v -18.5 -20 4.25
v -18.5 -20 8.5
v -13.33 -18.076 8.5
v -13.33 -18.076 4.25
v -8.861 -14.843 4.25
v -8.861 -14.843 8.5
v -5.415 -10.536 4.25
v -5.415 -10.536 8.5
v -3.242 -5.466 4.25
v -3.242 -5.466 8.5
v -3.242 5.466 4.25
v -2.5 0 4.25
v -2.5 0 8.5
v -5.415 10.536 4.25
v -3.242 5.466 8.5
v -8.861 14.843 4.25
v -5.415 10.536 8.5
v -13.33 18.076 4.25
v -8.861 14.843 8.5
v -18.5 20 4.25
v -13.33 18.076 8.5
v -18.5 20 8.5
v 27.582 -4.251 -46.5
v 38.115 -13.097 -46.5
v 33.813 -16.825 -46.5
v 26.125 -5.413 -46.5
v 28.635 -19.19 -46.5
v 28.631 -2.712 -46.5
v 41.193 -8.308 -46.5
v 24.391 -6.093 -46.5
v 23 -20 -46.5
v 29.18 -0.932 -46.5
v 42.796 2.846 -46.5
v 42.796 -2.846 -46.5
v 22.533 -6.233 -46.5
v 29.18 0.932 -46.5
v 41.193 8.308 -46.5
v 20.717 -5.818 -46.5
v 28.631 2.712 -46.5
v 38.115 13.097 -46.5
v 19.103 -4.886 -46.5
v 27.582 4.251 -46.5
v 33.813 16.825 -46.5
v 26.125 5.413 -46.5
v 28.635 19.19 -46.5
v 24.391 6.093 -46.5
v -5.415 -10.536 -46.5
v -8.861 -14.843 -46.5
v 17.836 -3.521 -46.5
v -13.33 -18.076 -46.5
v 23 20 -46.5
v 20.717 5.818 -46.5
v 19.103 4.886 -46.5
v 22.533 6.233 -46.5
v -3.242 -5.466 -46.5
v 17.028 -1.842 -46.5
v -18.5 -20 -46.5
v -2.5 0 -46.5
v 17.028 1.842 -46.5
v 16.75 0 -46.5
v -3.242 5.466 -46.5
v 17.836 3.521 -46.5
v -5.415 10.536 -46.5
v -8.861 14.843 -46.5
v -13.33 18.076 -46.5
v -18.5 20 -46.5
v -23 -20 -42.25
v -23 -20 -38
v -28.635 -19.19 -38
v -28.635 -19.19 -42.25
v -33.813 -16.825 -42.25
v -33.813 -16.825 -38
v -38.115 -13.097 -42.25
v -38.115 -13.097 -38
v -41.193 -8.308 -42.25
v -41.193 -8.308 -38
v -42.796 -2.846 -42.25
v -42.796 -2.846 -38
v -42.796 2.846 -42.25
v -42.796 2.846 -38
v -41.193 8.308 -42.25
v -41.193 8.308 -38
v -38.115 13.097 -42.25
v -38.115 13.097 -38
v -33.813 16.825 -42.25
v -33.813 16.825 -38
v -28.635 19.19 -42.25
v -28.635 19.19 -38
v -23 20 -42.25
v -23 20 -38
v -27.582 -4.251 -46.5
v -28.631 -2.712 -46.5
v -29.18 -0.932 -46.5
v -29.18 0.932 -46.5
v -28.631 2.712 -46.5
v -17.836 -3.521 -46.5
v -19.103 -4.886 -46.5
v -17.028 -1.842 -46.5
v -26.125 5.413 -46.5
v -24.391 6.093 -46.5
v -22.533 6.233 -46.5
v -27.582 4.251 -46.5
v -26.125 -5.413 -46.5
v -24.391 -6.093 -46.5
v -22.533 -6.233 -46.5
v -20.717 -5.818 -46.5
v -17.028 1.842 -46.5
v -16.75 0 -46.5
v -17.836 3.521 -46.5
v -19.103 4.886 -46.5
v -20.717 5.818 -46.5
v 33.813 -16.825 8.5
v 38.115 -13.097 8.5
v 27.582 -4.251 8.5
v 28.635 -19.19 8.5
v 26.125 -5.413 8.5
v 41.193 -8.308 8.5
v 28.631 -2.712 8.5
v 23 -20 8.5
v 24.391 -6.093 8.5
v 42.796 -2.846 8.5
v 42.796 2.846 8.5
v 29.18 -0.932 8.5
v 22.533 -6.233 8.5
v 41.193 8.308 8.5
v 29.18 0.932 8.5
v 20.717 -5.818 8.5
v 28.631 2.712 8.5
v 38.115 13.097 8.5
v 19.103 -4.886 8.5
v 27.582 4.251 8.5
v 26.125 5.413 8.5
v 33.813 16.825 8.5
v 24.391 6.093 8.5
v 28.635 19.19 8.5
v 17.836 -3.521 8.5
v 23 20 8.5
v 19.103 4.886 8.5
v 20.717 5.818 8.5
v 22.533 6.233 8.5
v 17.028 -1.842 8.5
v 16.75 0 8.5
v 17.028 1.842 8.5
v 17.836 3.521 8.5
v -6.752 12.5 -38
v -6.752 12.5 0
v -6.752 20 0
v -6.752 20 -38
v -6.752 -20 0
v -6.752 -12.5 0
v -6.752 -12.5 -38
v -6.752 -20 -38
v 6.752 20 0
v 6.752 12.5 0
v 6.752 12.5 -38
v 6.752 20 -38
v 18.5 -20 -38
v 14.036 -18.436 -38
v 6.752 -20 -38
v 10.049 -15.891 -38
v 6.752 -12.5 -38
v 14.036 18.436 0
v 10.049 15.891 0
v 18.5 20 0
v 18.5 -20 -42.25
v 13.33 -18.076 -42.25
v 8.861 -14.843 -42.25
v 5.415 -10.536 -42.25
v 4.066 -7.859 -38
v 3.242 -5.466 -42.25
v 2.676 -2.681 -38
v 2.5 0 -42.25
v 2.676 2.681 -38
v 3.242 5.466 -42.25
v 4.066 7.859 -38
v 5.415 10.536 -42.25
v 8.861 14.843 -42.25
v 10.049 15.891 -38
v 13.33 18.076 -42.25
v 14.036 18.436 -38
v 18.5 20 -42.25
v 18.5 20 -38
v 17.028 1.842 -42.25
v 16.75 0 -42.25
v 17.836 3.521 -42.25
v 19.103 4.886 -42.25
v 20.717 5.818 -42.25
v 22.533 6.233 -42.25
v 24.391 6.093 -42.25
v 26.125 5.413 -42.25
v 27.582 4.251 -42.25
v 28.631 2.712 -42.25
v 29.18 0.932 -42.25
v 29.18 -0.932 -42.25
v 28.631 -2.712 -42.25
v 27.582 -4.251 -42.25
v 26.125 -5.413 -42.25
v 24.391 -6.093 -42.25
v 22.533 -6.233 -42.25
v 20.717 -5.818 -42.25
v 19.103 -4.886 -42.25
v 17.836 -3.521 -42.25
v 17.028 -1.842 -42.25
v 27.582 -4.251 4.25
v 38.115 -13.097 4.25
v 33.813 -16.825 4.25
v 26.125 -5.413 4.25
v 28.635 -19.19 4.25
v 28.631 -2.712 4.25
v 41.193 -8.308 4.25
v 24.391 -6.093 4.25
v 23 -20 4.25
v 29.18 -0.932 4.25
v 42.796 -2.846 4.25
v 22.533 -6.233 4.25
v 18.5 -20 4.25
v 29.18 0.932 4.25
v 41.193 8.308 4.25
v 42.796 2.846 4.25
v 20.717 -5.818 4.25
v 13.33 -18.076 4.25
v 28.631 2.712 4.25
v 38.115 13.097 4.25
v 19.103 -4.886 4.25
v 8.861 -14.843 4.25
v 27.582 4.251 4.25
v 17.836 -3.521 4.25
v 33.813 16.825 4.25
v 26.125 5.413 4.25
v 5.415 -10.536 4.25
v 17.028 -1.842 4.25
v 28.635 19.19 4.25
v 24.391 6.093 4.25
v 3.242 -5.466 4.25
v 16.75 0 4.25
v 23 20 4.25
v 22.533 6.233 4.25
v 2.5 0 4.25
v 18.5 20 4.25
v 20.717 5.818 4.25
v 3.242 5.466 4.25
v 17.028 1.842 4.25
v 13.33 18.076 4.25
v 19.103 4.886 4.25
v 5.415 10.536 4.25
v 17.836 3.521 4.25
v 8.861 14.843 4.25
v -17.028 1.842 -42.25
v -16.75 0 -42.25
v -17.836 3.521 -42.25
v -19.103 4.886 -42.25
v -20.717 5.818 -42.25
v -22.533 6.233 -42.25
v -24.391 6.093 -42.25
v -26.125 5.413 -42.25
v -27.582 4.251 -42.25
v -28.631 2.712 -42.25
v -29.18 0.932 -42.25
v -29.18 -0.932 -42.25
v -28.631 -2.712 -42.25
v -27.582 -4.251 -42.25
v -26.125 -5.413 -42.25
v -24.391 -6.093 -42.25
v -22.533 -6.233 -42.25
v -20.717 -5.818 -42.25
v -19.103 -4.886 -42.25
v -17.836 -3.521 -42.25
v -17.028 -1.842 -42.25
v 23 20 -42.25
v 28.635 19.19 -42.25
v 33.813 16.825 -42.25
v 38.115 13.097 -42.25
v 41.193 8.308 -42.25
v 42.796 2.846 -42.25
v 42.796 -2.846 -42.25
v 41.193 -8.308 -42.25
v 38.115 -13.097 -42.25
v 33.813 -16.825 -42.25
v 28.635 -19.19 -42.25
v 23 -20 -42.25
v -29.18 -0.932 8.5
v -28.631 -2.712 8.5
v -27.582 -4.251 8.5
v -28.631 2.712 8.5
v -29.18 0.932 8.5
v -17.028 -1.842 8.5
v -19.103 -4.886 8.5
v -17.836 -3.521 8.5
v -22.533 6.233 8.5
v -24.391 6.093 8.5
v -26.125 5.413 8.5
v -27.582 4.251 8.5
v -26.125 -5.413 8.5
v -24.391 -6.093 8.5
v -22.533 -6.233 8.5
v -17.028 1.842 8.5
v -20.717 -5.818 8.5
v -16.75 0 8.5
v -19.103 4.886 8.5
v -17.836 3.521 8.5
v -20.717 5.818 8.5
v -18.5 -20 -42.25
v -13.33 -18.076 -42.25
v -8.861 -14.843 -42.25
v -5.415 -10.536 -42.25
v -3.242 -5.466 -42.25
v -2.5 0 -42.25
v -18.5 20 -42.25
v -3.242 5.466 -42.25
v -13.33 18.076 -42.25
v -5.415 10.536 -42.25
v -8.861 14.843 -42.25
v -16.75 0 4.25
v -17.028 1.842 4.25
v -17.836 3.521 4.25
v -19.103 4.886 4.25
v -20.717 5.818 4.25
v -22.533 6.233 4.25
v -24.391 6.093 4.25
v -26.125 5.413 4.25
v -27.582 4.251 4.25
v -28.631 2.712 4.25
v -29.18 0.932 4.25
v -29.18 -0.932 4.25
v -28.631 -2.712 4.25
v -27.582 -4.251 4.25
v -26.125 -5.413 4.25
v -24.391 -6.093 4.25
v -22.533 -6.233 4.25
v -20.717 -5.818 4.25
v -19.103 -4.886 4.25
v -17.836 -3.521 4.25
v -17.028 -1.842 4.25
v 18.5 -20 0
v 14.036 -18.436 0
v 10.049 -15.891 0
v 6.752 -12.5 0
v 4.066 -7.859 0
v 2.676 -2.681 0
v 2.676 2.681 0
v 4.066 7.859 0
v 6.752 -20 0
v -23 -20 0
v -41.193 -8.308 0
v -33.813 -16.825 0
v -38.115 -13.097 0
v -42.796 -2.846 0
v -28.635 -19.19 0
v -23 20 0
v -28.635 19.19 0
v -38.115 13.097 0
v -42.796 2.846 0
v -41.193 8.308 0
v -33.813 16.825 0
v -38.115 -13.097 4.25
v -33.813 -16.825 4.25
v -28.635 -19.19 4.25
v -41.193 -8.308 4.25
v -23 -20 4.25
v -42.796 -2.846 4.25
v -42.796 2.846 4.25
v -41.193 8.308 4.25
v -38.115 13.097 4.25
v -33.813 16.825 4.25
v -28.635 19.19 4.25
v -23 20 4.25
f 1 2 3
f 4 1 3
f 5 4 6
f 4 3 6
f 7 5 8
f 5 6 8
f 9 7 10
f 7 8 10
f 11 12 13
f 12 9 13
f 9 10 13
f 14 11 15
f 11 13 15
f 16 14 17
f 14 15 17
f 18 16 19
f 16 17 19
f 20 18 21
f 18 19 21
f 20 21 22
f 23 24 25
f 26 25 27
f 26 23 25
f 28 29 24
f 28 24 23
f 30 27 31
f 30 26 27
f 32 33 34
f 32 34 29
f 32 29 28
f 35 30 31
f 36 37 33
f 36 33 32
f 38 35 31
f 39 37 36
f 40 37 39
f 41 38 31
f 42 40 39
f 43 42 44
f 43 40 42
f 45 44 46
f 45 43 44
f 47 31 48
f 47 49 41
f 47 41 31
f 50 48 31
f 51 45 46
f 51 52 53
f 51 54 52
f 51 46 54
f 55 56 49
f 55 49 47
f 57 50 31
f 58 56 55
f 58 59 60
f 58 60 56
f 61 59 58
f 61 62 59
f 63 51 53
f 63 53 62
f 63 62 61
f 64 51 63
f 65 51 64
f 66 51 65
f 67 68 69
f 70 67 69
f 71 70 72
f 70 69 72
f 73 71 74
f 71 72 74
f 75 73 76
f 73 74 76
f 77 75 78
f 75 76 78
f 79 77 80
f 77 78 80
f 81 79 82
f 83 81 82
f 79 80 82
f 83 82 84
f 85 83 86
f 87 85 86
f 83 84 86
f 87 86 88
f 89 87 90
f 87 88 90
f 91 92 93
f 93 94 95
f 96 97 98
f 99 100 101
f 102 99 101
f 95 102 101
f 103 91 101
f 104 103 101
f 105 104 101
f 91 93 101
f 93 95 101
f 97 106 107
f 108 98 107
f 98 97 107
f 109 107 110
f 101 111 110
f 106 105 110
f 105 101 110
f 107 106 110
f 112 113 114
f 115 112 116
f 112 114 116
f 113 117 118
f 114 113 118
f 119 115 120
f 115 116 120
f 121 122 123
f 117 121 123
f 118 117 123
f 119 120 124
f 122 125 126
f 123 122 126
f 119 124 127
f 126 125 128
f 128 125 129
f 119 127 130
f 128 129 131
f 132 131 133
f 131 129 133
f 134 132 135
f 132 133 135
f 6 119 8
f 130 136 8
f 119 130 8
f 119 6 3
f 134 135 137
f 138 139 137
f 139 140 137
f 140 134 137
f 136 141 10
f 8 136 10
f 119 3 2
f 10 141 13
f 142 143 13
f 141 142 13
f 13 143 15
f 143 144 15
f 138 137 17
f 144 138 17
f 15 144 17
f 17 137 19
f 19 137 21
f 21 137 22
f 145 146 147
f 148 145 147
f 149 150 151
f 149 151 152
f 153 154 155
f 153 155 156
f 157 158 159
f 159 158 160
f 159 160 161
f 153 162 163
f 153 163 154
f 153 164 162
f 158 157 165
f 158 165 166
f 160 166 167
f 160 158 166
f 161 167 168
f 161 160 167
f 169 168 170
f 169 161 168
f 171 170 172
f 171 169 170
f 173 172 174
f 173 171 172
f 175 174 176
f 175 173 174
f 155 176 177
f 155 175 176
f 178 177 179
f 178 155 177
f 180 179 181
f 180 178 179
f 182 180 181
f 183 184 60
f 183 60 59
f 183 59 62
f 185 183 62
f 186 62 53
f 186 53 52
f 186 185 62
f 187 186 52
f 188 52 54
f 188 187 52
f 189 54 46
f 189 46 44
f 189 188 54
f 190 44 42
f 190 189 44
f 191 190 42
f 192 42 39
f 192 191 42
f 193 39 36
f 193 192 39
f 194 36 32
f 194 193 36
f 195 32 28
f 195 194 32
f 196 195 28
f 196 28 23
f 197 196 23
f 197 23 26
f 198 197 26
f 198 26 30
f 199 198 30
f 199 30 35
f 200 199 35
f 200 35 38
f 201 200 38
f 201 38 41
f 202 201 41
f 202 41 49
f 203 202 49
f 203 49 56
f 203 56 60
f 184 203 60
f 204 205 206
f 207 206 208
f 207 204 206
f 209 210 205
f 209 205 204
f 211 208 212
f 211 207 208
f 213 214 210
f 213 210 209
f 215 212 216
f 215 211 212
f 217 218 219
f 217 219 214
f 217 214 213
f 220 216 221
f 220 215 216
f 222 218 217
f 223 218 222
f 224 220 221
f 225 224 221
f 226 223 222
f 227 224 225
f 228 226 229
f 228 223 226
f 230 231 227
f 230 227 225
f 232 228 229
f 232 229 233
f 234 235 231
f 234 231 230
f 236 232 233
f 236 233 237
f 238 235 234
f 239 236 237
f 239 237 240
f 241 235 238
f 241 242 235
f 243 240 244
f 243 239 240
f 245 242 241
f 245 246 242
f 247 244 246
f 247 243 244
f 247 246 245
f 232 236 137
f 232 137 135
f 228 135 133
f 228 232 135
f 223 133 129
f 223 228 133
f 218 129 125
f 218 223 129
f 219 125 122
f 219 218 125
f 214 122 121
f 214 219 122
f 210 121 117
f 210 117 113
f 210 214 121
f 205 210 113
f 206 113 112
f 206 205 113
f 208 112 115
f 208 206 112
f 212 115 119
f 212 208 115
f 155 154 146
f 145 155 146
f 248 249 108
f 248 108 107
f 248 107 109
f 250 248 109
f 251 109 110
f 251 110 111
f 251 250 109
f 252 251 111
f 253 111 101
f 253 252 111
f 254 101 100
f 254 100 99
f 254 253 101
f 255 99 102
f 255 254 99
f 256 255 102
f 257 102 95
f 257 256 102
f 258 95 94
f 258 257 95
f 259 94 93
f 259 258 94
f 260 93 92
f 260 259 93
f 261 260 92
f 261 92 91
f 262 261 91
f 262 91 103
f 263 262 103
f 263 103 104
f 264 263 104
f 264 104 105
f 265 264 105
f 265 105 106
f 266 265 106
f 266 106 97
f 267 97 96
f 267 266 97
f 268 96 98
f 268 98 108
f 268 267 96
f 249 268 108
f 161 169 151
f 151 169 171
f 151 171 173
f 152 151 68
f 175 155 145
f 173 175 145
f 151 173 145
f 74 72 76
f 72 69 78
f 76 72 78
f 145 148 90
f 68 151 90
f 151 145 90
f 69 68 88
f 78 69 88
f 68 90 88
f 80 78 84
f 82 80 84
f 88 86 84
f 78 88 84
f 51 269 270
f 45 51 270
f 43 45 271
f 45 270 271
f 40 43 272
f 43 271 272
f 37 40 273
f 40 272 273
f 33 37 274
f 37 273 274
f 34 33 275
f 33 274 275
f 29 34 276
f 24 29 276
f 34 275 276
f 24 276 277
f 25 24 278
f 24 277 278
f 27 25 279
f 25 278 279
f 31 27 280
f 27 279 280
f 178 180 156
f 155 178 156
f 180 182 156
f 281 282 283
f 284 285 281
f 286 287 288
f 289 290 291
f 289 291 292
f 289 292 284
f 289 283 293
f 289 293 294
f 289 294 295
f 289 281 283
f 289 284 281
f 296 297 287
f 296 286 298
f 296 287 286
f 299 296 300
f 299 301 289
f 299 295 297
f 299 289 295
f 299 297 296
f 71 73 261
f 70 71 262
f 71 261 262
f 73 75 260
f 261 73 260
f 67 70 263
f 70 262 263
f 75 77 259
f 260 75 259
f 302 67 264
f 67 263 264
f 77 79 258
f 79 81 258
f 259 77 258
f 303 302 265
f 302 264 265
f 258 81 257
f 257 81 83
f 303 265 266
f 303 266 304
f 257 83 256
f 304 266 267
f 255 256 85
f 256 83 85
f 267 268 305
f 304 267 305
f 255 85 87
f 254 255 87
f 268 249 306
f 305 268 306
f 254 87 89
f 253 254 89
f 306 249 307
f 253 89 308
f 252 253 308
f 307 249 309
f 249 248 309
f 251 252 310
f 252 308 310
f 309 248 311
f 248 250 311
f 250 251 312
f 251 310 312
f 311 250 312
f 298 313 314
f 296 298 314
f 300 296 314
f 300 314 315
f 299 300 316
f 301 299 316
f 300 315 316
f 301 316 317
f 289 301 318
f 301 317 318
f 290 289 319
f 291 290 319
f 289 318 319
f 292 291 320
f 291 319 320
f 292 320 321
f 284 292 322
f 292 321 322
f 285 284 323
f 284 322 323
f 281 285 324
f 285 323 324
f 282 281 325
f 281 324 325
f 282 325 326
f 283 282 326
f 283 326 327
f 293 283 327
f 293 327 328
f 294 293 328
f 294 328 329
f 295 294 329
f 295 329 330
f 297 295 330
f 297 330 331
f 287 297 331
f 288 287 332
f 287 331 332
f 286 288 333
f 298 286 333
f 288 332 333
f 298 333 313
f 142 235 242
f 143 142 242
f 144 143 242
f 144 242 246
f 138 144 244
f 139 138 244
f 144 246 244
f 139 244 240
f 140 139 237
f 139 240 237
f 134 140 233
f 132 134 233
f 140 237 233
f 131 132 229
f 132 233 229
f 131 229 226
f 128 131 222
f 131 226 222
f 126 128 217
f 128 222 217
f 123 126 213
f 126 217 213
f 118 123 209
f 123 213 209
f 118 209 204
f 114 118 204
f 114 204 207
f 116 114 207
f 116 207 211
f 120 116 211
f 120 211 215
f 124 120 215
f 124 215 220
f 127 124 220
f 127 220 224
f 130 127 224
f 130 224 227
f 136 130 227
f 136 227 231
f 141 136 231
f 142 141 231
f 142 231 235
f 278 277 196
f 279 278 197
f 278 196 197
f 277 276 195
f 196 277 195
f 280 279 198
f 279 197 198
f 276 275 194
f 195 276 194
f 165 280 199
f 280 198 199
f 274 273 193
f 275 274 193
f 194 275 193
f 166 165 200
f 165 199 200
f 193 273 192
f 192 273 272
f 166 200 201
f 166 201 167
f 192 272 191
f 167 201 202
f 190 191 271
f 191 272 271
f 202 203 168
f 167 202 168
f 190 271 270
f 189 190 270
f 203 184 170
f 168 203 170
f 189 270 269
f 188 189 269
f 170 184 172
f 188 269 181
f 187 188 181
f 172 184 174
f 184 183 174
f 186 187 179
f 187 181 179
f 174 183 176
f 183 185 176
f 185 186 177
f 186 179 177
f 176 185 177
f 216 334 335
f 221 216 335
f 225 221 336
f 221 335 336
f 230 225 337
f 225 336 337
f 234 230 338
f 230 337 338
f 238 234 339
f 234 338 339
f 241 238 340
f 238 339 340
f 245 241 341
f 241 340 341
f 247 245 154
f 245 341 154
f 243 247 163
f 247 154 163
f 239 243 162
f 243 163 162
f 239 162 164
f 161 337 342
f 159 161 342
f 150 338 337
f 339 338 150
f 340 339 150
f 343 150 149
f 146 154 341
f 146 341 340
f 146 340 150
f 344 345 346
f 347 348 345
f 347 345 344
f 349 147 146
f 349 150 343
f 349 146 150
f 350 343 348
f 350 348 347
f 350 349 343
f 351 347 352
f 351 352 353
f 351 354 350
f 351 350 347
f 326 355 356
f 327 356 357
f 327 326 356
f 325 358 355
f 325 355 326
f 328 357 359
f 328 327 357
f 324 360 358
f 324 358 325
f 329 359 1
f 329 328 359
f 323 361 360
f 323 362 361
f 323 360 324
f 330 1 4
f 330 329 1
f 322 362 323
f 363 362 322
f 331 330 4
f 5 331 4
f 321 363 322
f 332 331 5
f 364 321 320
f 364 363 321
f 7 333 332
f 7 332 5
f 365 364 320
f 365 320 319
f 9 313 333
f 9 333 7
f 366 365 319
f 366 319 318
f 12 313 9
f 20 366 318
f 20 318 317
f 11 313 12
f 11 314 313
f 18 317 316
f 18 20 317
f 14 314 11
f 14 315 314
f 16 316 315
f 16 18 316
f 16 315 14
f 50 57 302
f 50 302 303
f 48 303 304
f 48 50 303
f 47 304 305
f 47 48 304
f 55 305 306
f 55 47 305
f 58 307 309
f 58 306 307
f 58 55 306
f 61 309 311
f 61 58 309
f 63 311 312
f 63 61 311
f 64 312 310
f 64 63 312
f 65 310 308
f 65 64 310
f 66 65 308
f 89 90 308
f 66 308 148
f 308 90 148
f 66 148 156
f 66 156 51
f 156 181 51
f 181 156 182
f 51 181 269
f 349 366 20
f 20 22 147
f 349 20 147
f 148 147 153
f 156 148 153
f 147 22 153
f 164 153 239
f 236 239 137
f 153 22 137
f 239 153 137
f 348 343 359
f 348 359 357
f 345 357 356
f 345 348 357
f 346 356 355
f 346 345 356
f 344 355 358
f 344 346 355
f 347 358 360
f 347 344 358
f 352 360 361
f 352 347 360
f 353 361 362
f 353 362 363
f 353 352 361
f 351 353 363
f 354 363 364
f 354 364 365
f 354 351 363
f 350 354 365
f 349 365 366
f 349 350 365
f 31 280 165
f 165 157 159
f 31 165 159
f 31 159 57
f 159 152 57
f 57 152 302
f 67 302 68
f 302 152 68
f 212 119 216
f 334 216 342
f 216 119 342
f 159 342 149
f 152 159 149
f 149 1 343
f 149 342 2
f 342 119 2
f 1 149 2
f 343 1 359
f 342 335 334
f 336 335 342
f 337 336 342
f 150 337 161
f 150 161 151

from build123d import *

# Parameters (mm, degrees)
BOSS_EXTRUDE1_DEPTH = 8.5
SKETCH2_R           = 20.5
CUT_EXTRUDE1_DEPTH  = 4.25
SKETCH3_R           = 20.5
CUT_EXTRUDE2_DEPTH  = 4.25
SKETCH4_R           = 6.25
CUT_EXTRUDE3_DEPTH  = 5.25
SKETCH5_R           = 6.25
BOSS_EXTRUDE2_DEPTH = 4.25
SKETCH6_W           = 13.503846382
SKETCH6_H           = 7.5
BOSS_EXTRUDE3_DEPTH = 38


with BuildPart() as part:
    # Sketch1 → Boss-Extrude1 (new body)
    with BuildSketch(Plane.XY):
        with BuildLine():
            Line((-23, 20), (23, 20))
            ThreePointArc((23, 20), (43, 0), (23, -20))
            Line((23, -20), (-23, -20))
            ThreePointArc((-23, -20), (-43, 0), (-23, 20))
        make_face()
    extrude(amount=BOSS_EXTRUDE1_DEPTH)

    # Sketch2 → Cut-Extrude1 (cut)
    with BuildSketch(Plane(origin=(0, 0, 0), x_dir=(-1, 0, 0), z_dir=(0, 0, -1))):
        with Locations((-23, 0)):
            Circle(SKETCH2_R)
    extrude(amount=-CUT_EXTRUDE1_DEPTH, mode=Mode.SUBTRACT)

    # Sketch3 → Cut-Extrude2 (cut)
    with BuildSketch(Plane.XY.offset(8.5)):
        with Locations((-23, 0)):
            Circle(SKETCH3_R)
    extrude(amount=-CUT_EXTRUDE2_DEPTH, mode=Mode.SUBTRACT)

    # Sketch4 → Cut-Extrude3 (cut, through all)
    with BuildSketch(Plane(origin=(0, 0, 4.25), x_dir=(-1, 0, 0), z_dir=(0, 0, -1))):
        with Locations((-23, 0)):
            Circle(SKETCH4_R)
    extrude(amount=-CUT_EXTRUDE3_DEPTH, mode=Mode.SUBTRACT)

    # Sketch5 → Boss-Extrude2 (add)
    with BuildSketch(Plane.XY.offset(4.25)):
        with Locations((-23, 0)):
            Circle(SKETCH5_R)
    extrude(amount=BOSS_EXTRUDE2_DEPTH)

    # Sketch6 → Boss-Extrude3 (add)
    with BuildSketch(Plane(origin=(0, 0, 0), x_dir=(-1, 0, 0), z_dir=(0, 0, -1))):
        with Locations((0, 16.25)):
            Rectangle(SKETCH6_W, SKETCH6_H)
    boss_extrude3 = extrude(amount=BOSS_EXTRUDE3_DEPTH)

    # Mirror1: Boss-Extrude3 across plane
    add(boss_extrude3.mirror(Plane.ZX))

    # Зеркальное отражение1: part across plane


with BuildPart() as part_1:
    add(part.part)
    add(part.part.mirror(Plane.XY.offset(-19)))


solid = part_1.part
